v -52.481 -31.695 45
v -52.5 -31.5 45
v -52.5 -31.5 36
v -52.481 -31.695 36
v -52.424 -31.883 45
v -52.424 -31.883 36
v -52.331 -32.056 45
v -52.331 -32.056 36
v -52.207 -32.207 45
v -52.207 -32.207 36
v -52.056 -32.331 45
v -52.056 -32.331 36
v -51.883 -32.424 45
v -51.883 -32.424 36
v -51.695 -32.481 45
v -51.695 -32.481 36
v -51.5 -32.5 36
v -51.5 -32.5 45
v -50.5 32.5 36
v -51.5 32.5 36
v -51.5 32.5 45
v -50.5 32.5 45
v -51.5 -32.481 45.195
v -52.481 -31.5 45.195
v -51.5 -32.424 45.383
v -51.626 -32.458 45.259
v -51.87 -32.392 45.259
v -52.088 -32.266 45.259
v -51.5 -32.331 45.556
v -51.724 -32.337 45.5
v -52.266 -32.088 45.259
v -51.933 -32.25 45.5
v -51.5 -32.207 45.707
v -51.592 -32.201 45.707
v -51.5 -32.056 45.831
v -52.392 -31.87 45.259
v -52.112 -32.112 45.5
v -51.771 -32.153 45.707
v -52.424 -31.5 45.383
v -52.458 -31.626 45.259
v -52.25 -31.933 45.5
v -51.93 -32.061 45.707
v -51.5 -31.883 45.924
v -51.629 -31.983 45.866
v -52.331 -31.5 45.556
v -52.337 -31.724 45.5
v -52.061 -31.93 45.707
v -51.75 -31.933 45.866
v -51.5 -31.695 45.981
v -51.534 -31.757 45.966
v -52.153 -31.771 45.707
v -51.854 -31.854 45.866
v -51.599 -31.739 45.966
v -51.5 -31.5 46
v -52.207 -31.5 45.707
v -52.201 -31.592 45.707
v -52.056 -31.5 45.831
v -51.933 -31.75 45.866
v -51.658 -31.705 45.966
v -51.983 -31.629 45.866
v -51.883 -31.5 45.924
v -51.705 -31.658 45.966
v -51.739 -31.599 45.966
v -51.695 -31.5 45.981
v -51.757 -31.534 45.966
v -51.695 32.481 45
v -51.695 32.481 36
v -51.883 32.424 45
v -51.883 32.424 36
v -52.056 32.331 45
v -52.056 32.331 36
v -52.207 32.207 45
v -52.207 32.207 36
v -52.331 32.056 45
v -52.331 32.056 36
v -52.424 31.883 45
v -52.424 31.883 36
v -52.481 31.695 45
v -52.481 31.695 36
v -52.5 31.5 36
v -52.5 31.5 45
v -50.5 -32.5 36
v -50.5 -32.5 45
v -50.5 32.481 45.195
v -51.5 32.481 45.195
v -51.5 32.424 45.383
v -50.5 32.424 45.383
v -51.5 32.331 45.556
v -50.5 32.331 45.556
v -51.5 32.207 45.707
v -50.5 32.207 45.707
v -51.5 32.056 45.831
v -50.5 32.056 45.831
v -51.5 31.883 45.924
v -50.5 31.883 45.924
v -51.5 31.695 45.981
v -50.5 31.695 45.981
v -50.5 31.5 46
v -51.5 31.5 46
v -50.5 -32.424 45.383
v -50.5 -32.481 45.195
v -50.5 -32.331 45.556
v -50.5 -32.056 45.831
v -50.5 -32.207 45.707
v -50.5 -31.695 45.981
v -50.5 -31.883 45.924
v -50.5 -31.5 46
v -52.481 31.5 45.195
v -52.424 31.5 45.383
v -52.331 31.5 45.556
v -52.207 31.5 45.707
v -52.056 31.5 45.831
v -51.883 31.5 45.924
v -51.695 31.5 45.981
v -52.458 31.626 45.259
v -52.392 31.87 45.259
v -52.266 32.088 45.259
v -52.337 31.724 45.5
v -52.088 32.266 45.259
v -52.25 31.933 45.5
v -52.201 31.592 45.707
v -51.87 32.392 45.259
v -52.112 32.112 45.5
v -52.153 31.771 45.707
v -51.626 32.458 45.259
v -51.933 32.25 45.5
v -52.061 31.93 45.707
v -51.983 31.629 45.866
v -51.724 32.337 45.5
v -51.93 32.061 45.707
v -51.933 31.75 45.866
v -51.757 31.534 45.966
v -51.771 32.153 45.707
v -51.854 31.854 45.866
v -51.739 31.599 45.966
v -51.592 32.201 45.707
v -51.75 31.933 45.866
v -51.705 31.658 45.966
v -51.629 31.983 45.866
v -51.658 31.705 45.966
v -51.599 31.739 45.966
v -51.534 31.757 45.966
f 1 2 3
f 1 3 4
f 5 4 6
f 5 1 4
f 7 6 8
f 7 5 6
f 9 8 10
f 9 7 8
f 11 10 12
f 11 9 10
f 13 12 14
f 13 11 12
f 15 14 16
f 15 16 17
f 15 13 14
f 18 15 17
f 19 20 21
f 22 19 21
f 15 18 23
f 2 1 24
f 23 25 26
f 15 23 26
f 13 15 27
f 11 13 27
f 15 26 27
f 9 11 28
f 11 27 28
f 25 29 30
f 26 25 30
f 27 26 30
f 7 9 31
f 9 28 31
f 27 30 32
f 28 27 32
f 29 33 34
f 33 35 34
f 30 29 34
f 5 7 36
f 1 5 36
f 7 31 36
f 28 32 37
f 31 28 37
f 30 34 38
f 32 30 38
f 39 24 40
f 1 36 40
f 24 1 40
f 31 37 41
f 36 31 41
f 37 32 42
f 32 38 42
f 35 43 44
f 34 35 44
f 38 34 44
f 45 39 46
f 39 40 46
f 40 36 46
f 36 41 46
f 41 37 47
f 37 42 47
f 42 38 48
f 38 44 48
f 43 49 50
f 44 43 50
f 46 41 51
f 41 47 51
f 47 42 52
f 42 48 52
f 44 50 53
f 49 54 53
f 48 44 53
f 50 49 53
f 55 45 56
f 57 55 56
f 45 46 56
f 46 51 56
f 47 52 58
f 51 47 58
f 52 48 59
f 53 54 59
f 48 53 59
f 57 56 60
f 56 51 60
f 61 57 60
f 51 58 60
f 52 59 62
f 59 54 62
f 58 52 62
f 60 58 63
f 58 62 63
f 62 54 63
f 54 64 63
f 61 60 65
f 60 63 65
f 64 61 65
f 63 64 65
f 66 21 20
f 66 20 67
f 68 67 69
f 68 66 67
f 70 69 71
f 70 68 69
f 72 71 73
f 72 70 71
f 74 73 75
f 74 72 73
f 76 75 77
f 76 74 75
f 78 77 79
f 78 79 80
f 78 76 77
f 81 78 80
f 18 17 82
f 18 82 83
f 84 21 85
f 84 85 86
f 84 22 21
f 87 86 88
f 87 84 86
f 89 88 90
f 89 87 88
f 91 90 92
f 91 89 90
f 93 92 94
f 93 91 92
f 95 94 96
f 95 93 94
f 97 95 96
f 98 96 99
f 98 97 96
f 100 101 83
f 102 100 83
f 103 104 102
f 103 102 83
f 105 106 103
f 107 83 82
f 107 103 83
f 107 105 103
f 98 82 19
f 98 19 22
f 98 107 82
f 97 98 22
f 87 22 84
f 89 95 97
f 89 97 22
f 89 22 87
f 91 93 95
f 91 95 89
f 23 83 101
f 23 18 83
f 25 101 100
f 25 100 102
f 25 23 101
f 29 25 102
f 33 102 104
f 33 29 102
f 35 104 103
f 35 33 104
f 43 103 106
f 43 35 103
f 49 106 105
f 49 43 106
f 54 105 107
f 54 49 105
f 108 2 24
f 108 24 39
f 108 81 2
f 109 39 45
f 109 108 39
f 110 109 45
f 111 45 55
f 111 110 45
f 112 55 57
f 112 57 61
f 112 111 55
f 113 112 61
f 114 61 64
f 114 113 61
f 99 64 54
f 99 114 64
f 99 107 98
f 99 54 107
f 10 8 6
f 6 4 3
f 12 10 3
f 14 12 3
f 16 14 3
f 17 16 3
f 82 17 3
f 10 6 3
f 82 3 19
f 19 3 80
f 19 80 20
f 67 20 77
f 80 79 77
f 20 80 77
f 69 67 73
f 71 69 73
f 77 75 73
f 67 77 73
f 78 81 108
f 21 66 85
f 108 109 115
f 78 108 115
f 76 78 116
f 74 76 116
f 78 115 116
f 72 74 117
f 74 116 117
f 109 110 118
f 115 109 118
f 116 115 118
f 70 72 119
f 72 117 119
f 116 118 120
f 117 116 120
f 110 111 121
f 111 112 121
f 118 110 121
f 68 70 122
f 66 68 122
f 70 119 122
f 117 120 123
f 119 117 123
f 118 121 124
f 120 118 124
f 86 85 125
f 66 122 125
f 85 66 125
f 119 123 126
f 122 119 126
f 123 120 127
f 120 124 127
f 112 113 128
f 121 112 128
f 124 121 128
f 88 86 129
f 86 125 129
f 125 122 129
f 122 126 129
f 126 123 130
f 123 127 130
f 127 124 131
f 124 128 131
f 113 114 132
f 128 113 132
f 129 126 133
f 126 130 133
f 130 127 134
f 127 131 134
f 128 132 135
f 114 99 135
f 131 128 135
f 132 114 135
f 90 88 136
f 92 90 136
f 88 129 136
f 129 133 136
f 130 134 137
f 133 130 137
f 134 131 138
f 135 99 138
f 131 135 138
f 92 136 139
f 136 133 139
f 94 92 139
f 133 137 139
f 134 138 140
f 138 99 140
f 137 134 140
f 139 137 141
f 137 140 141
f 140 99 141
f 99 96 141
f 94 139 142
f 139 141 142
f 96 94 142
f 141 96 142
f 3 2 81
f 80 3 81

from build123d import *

# Parameters (mm, degrees)
SKETCH009_W  = 65
SKETCH009_H  = 10
PAD008_DEPTH = 2
FILLET013_R  = 1
FILLET020_R  = 1
FILLET027_R  = 1


with BuildPart() as part:
    # Sketch009 → Pad008 (new body)
    with BuildSketch(Plane.YZ):
        with Locations((0, 5)):
            Rectangle(SKETCH009_W, SKETCH009_H)
    extrude(amount=PAD008_DEPTH)

    # Fillet013
    fillet013_edges = [part.edges().sort_by_distance(p)[0] for p in [
        (0, 32.5, 5),
    ]]
    fillet(fillet013_edges, radius=FILLET013_R)

    # Fillet020
    fillet020_edges = [part.edges().sort_by_distance(p)[0] for p in [
        (0, -32.5, 5),
    ]]
    fillet(fillet020_edges, radius=FILLET020_R)

    # Fillet027
    fillet027_edges = [part.edges().sort_by_distance(p)[0] for p in [
        (0, 0, 10),
    ]]
    fillet(fillet027_edges, radius=FILLET027_R)


with BuildPart() as part_1:
    # Body008 placement: moved
    add(part.part.moved(Location((-52.5, 0, 36))))


solid = part_1.part
